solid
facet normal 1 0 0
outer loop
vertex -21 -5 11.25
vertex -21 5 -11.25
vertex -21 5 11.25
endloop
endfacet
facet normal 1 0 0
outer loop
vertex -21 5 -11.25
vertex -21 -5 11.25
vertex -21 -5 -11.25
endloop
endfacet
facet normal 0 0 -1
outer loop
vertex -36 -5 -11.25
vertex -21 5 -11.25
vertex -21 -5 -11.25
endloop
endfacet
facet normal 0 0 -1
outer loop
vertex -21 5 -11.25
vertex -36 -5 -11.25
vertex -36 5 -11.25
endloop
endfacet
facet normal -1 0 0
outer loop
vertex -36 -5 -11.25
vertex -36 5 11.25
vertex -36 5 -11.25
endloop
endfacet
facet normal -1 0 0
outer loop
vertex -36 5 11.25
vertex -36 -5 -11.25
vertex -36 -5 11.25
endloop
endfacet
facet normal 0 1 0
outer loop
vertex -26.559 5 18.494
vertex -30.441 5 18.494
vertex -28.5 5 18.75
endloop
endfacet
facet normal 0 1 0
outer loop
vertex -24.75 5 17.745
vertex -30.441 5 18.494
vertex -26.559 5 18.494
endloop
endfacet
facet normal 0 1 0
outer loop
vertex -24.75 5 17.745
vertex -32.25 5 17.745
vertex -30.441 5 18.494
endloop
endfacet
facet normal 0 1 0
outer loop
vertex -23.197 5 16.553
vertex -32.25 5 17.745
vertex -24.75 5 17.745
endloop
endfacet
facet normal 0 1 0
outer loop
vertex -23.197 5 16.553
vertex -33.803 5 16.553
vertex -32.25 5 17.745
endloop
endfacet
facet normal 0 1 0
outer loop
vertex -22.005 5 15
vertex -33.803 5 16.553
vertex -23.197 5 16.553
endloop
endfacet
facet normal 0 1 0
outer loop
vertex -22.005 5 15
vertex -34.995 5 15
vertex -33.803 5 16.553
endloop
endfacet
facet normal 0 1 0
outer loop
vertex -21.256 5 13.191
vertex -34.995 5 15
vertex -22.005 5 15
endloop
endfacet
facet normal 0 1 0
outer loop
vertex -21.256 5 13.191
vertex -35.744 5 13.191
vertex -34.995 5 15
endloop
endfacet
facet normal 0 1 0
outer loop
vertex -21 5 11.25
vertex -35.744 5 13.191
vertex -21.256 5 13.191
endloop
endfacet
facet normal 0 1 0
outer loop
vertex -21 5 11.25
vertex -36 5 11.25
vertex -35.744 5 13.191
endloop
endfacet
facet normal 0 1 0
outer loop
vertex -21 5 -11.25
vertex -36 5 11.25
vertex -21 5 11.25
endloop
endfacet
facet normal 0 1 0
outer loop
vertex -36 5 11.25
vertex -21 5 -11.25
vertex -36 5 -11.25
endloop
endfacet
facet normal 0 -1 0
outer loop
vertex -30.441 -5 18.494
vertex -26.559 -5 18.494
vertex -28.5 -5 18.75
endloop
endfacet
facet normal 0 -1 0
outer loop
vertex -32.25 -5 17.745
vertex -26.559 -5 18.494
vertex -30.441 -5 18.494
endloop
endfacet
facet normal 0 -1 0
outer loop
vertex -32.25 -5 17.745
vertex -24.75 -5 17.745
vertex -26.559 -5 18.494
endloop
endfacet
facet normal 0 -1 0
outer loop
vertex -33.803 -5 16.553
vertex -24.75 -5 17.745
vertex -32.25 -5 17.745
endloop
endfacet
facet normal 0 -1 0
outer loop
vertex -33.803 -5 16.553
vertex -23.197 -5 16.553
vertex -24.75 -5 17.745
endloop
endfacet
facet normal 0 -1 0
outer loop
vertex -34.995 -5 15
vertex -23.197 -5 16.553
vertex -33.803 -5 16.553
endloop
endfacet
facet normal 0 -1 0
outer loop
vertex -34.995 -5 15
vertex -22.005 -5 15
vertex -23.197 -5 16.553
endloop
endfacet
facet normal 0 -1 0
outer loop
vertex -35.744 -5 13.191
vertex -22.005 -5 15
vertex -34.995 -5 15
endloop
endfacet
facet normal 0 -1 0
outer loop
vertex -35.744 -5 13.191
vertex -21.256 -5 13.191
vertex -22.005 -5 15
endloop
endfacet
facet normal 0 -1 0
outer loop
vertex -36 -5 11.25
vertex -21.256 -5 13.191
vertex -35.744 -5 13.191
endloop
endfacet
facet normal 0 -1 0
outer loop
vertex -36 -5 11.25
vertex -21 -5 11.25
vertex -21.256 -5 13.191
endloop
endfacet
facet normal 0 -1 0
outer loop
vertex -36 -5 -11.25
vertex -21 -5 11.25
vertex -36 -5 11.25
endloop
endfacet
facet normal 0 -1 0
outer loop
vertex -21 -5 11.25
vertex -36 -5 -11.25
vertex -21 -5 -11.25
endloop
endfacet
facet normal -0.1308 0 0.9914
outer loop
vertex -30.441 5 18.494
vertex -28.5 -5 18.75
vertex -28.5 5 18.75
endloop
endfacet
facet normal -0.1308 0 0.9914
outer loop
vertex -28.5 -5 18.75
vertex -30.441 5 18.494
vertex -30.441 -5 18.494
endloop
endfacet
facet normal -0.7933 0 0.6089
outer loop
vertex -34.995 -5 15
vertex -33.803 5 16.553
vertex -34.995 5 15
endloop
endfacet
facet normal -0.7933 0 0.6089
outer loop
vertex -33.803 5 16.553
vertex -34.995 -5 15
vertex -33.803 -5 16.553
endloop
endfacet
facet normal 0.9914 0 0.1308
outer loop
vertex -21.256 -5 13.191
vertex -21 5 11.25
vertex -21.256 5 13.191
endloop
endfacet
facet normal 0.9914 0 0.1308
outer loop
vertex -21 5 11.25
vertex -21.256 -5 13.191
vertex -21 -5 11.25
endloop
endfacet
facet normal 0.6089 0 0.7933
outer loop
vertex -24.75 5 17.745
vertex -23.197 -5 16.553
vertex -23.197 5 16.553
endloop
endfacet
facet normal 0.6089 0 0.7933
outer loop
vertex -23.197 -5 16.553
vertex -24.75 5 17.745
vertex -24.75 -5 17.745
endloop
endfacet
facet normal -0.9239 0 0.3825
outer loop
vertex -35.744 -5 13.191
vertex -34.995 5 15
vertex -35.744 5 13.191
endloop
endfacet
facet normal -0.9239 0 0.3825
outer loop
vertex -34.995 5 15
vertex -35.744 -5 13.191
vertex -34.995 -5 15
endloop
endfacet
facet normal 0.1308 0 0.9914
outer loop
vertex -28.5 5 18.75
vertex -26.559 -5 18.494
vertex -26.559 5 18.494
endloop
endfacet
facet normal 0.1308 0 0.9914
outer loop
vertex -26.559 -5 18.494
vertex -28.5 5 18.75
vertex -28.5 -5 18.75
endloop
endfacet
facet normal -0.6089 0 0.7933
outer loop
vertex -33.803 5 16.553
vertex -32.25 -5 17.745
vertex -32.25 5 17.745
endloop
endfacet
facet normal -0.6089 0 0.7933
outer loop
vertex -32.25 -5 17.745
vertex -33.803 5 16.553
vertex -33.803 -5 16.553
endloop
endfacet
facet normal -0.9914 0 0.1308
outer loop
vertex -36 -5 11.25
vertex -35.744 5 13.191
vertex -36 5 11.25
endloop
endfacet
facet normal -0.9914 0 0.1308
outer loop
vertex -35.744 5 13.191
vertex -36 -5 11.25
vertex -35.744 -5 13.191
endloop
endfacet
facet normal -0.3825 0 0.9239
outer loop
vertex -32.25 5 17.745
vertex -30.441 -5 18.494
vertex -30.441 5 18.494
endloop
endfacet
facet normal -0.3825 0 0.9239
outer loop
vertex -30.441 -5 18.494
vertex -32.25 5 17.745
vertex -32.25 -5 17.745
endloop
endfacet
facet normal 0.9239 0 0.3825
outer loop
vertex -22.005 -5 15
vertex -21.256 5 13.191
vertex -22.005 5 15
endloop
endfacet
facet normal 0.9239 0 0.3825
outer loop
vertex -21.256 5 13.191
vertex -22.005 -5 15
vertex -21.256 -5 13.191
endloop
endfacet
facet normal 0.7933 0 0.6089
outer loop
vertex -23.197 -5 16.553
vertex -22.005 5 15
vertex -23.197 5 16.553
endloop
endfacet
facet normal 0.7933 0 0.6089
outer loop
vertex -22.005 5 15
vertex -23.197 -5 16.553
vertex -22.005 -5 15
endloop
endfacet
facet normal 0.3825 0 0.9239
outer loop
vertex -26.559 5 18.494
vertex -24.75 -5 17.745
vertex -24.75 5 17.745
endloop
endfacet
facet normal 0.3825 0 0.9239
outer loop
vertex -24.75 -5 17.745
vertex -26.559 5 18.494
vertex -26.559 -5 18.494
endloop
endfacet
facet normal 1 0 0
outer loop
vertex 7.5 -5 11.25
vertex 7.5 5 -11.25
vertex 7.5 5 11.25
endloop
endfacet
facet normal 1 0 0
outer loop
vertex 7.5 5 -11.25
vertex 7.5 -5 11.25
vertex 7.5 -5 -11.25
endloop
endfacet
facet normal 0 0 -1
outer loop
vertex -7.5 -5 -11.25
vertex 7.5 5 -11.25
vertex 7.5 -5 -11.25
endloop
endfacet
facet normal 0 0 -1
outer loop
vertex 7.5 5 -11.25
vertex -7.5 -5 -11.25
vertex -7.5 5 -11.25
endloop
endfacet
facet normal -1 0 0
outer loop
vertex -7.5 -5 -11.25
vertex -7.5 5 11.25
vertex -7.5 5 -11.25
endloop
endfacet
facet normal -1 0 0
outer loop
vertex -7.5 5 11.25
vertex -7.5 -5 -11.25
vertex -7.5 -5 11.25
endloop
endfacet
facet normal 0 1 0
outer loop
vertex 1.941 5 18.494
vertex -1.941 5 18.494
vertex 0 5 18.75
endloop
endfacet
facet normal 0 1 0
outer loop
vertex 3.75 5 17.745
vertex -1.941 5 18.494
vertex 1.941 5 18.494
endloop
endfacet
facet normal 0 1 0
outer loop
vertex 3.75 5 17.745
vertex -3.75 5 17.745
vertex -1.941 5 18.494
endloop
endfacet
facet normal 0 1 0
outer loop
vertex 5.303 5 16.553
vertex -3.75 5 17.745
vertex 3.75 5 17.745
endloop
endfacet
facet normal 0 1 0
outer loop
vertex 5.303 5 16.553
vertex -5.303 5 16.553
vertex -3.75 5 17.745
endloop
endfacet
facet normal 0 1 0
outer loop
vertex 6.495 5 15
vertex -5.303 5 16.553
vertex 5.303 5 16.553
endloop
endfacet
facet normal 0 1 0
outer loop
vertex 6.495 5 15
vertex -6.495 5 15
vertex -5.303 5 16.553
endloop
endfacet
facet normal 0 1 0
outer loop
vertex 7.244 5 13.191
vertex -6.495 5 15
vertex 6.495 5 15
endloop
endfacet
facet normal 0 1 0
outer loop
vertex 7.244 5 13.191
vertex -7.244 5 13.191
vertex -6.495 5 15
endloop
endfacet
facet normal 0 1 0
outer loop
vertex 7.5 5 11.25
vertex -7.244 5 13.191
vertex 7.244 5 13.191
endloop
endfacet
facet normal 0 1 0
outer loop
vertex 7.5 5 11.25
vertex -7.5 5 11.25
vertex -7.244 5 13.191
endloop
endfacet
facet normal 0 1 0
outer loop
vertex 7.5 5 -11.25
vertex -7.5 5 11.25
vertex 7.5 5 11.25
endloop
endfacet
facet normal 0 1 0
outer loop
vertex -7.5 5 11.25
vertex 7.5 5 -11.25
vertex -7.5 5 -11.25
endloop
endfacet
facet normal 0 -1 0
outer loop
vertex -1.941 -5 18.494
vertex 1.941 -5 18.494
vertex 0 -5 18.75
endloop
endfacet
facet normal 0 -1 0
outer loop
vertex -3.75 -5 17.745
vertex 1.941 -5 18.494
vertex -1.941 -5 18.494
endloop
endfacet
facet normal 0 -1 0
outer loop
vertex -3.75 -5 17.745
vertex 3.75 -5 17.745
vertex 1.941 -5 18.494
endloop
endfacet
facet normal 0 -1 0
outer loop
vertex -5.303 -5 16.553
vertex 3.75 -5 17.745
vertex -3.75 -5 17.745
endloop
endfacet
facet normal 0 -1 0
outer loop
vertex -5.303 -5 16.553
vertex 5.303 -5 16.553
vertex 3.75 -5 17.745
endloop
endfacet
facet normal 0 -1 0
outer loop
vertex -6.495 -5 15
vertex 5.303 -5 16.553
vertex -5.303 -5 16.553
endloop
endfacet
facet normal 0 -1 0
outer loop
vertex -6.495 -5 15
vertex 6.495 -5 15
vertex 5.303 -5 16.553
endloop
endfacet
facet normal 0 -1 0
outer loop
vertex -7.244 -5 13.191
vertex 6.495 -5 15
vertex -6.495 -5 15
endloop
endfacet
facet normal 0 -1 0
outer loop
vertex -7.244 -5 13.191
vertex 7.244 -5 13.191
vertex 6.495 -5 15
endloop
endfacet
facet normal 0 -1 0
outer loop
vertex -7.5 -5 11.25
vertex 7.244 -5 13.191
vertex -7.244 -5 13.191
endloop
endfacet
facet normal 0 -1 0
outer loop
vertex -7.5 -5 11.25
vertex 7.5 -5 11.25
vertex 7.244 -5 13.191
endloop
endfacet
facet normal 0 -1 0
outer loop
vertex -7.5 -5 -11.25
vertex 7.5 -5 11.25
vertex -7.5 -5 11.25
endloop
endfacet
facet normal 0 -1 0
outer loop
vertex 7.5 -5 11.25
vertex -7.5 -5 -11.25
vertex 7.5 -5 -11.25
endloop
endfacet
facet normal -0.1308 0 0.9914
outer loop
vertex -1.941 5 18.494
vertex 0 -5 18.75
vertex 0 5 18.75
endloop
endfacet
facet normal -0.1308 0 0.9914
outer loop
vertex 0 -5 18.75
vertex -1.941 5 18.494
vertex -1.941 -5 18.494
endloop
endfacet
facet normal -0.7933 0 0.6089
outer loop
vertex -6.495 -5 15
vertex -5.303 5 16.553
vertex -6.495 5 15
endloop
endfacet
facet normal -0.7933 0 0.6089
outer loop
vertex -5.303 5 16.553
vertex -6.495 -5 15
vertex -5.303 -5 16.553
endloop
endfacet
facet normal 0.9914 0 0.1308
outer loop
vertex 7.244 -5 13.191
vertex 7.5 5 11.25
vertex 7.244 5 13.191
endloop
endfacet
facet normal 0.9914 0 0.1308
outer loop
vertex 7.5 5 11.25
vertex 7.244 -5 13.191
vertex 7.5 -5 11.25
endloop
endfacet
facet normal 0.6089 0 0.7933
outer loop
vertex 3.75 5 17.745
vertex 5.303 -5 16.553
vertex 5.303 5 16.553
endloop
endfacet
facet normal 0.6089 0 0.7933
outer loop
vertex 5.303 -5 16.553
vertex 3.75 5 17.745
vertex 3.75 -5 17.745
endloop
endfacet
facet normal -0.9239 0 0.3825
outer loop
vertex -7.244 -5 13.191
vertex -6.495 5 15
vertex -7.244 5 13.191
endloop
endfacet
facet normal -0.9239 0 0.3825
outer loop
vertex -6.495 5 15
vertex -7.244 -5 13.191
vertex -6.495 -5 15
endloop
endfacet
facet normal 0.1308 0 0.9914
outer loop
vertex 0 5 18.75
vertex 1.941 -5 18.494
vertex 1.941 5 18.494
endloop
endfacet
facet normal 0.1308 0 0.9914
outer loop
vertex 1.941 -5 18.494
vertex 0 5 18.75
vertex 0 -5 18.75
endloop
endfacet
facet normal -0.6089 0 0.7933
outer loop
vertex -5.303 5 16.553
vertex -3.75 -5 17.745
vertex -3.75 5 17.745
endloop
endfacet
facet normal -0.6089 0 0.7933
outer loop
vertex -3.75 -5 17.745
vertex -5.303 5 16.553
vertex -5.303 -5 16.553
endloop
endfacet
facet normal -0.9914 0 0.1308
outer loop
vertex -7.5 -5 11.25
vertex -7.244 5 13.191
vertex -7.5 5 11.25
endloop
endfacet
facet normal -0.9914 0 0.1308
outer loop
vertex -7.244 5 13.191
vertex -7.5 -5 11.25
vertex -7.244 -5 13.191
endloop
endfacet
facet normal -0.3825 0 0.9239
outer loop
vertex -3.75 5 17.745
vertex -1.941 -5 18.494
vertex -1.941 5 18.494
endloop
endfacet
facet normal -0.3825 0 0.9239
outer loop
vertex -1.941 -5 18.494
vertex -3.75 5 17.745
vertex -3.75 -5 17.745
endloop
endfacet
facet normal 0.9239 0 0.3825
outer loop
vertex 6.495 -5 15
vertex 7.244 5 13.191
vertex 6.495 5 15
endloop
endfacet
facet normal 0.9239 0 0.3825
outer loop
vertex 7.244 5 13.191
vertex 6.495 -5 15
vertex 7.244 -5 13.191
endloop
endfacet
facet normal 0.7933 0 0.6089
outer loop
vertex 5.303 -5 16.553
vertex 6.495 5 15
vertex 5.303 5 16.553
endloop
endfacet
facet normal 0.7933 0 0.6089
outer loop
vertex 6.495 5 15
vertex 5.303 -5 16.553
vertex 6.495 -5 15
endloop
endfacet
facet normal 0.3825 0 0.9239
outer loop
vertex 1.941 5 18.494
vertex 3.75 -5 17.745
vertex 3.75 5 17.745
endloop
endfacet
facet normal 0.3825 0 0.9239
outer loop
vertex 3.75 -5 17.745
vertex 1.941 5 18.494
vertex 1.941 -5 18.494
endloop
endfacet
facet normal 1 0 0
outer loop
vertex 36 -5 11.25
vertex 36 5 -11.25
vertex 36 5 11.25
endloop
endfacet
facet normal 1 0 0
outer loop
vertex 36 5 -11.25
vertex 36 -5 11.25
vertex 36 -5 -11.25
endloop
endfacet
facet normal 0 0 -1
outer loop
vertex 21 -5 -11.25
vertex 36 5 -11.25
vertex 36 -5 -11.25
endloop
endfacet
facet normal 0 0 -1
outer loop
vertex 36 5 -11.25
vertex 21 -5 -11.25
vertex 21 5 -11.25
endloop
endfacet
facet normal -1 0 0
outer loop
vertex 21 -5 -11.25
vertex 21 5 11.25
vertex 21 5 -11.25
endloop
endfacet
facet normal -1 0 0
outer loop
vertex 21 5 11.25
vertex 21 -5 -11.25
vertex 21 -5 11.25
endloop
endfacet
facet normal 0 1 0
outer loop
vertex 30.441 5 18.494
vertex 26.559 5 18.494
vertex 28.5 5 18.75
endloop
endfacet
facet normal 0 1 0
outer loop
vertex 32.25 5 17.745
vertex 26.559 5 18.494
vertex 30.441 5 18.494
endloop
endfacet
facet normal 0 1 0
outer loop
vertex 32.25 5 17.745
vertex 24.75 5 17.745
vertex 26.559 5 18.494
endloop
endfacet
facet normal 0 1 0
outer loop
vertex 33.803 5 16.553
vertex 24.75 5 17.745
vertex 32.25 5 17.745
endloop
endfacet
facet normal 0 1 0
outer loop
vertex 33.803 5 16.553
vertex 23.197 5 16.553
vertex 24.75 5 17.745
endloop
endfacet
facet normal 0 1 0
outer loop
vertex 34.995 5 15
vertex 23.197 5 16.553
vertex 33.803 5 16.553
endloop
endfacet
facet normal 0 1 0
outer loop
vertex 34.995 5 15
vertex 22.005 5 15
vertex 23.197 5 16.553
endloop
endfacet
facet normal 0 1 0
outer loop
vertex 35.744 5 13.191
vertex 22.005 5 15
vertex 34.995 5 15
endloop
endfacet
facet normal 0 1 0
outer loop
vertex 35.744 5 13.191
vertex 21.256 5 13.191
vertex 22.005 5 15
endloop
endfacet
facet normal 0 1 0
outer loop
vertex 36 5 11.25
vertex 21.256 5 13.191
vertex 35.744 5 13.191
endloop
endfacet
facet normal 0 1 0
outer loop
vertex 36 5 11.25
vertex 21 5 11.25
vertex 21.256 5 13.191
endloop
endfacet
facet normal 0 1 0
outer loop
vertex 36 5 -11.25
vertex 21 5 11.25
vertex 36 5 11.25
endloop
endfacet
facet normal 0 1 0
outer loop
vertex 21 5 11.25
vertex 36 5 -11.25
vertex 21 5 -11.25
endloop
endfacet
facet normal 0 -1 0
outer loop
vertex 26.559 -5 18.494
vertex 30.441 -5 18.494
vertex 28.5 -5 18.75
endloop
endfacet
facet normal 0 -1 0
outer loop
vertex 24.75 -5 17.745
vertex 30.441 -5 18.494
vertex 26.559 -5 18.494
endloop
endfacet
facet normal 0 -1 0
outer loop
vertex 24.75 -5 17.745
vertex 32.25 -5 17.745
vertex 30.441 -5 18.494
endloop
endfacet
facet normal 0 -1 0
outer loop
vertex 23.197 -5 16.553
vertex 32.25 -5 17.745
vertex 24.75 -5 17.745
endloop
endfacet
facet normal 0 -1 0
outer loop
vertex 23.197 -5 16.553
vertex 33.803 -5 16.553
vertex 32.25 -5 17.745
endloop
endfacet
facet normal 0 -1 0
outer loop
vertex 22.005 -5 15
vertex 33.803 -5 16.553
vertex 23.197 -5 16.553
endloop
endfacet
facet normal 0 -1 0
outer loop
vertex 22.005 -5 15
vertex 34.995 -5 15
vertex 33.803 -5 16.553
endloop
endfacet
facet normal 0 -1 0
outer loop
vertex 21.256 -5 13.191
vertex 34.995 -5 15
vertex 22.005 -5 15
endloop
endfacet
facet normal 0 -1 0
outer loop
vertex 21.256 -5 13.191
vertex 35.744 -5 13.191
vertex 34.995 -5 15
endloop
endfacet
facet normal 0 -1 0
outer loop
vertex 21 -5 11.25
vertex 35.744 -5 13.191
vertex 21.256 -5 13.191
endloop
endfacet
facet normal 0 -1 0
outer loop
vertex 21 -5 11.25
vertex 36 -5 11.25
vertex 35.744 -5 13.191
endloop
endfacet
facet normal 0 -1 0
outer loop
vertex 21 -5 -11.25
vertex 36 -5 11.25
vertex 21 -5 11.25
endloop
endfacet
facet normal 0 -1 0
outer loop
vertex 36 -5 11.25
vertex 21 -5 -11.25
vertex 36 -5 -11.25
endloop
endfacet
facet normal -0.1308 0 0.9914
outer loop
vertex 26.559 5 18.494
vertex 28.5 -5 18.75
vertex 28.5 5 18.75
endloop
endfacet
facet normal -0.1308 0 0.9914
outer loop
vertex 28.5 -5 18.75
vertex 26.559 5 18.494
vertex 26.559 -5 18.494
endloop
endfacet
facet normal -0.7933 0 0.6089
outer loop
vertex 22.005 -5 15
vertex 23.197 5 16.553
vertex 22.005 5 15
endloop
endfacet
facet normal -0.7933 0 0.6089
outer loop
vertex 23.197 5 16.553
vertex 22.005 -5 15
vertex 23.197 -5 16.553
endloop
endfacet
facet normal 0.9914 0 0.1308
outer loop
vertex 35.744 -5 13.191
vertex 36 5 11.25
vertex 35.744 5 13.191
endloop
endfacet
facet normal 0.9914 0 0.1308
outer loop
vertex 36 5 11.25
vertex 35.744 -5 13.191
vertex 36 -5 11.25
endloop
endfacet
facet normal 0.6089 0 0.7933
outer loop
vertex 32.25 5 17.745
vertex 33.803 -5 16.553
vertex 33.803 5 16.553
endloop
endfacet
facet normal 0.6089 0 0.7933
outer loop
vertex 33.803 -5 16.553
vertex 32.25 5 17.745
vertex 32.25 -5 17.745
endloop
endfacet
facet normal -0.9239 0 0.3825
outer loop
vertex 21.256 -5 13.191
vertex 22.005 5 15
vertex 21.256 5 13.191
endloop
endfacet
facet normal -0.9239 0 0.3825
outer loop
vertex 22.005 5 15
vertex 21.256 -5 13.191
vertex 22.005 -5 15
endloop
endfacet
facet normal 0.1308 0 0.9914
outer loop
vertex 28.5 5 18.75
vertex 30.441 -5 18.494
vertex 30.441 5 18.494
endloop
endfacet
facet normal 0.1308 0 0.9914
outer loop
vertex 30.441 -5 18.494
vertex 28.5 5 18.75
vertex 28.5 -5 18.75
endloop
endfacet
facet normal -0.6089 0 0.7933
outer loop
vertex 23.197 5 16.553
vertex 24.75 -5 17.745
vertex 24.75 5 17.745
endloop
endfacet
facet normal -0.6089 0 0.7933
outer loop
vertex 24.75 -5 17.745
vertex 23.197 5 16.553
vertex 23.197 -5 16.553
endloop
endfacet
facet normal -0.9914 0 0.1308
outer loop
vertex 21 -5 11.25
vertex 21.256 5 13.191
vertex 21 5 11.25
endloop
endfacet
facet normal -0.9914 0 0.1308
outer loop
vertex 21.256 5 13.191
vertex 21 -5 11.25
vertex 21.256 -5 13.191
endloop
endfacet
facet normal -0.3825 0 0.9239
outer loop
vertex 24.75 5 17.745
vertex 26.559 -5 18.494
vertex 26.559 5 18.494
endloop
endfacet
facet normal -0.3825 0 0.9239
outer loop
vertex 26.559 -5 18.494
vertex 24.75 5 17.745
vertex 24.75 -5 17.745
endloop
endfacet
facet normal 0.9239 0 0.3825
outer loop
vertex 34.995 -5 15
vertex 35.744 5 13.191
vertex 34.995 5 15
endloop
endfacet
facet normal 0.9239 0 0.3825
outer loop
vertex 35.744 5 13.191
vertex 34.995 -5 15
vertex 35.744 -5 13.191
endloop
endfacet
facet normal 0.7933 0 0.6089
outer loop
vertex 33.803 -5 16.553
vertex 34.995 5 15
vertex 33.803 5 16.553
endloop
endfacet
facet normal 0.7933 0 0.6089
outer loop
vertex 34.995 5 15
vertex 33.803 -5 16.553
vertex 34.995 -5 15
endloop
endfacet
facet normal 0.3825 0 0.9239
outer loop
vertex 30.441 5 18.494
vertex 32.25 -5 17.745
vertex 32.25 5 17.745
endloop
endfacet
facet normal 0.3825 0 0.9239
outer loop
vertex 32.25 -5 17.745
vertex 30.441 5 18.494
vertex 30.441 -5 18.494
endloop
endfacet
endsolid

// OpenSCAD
 windowLength = 57;
 archModifier = 0.75;
 
 windowVerticalCushion = 10;
 windowHorizontalCushion = 0;
 windowHeight = 50;
 smallWindowWidth = 15;
 smallWindows = 2;
 smallWindowDepth = 10;
 
 archDepth = 150;
 
 module window() {
     difference() {
         %translate([0,archDepth/-2, 0]) cube([windowLength, archDepth, windowHeight + windowVerticalCushion * 2], center = true);
         translate([]) {
             for(i = [0:smallWindows]) {
                 #translate([windowLength/-2 + ((windowLength - windowHorizontalCushion*2) / smallWindows * i), 0,0]) kickboard(smallWindowWidth, smallWindowDepth, windowHeight - windowVerticalCushion * 2);
             }
         }
     }
 }
 
 window();
 
 
 module kickboard(width, depth, height) {
    union() {
        cube([width, depth, height - width/2], center = true);
        translate([0,0, (height - width/2) / 2]) {
            rotate([0, 90, 90]) {
                cylinder(r = width/2, h = depth, center = true);
            }
        }
    }
}
   
